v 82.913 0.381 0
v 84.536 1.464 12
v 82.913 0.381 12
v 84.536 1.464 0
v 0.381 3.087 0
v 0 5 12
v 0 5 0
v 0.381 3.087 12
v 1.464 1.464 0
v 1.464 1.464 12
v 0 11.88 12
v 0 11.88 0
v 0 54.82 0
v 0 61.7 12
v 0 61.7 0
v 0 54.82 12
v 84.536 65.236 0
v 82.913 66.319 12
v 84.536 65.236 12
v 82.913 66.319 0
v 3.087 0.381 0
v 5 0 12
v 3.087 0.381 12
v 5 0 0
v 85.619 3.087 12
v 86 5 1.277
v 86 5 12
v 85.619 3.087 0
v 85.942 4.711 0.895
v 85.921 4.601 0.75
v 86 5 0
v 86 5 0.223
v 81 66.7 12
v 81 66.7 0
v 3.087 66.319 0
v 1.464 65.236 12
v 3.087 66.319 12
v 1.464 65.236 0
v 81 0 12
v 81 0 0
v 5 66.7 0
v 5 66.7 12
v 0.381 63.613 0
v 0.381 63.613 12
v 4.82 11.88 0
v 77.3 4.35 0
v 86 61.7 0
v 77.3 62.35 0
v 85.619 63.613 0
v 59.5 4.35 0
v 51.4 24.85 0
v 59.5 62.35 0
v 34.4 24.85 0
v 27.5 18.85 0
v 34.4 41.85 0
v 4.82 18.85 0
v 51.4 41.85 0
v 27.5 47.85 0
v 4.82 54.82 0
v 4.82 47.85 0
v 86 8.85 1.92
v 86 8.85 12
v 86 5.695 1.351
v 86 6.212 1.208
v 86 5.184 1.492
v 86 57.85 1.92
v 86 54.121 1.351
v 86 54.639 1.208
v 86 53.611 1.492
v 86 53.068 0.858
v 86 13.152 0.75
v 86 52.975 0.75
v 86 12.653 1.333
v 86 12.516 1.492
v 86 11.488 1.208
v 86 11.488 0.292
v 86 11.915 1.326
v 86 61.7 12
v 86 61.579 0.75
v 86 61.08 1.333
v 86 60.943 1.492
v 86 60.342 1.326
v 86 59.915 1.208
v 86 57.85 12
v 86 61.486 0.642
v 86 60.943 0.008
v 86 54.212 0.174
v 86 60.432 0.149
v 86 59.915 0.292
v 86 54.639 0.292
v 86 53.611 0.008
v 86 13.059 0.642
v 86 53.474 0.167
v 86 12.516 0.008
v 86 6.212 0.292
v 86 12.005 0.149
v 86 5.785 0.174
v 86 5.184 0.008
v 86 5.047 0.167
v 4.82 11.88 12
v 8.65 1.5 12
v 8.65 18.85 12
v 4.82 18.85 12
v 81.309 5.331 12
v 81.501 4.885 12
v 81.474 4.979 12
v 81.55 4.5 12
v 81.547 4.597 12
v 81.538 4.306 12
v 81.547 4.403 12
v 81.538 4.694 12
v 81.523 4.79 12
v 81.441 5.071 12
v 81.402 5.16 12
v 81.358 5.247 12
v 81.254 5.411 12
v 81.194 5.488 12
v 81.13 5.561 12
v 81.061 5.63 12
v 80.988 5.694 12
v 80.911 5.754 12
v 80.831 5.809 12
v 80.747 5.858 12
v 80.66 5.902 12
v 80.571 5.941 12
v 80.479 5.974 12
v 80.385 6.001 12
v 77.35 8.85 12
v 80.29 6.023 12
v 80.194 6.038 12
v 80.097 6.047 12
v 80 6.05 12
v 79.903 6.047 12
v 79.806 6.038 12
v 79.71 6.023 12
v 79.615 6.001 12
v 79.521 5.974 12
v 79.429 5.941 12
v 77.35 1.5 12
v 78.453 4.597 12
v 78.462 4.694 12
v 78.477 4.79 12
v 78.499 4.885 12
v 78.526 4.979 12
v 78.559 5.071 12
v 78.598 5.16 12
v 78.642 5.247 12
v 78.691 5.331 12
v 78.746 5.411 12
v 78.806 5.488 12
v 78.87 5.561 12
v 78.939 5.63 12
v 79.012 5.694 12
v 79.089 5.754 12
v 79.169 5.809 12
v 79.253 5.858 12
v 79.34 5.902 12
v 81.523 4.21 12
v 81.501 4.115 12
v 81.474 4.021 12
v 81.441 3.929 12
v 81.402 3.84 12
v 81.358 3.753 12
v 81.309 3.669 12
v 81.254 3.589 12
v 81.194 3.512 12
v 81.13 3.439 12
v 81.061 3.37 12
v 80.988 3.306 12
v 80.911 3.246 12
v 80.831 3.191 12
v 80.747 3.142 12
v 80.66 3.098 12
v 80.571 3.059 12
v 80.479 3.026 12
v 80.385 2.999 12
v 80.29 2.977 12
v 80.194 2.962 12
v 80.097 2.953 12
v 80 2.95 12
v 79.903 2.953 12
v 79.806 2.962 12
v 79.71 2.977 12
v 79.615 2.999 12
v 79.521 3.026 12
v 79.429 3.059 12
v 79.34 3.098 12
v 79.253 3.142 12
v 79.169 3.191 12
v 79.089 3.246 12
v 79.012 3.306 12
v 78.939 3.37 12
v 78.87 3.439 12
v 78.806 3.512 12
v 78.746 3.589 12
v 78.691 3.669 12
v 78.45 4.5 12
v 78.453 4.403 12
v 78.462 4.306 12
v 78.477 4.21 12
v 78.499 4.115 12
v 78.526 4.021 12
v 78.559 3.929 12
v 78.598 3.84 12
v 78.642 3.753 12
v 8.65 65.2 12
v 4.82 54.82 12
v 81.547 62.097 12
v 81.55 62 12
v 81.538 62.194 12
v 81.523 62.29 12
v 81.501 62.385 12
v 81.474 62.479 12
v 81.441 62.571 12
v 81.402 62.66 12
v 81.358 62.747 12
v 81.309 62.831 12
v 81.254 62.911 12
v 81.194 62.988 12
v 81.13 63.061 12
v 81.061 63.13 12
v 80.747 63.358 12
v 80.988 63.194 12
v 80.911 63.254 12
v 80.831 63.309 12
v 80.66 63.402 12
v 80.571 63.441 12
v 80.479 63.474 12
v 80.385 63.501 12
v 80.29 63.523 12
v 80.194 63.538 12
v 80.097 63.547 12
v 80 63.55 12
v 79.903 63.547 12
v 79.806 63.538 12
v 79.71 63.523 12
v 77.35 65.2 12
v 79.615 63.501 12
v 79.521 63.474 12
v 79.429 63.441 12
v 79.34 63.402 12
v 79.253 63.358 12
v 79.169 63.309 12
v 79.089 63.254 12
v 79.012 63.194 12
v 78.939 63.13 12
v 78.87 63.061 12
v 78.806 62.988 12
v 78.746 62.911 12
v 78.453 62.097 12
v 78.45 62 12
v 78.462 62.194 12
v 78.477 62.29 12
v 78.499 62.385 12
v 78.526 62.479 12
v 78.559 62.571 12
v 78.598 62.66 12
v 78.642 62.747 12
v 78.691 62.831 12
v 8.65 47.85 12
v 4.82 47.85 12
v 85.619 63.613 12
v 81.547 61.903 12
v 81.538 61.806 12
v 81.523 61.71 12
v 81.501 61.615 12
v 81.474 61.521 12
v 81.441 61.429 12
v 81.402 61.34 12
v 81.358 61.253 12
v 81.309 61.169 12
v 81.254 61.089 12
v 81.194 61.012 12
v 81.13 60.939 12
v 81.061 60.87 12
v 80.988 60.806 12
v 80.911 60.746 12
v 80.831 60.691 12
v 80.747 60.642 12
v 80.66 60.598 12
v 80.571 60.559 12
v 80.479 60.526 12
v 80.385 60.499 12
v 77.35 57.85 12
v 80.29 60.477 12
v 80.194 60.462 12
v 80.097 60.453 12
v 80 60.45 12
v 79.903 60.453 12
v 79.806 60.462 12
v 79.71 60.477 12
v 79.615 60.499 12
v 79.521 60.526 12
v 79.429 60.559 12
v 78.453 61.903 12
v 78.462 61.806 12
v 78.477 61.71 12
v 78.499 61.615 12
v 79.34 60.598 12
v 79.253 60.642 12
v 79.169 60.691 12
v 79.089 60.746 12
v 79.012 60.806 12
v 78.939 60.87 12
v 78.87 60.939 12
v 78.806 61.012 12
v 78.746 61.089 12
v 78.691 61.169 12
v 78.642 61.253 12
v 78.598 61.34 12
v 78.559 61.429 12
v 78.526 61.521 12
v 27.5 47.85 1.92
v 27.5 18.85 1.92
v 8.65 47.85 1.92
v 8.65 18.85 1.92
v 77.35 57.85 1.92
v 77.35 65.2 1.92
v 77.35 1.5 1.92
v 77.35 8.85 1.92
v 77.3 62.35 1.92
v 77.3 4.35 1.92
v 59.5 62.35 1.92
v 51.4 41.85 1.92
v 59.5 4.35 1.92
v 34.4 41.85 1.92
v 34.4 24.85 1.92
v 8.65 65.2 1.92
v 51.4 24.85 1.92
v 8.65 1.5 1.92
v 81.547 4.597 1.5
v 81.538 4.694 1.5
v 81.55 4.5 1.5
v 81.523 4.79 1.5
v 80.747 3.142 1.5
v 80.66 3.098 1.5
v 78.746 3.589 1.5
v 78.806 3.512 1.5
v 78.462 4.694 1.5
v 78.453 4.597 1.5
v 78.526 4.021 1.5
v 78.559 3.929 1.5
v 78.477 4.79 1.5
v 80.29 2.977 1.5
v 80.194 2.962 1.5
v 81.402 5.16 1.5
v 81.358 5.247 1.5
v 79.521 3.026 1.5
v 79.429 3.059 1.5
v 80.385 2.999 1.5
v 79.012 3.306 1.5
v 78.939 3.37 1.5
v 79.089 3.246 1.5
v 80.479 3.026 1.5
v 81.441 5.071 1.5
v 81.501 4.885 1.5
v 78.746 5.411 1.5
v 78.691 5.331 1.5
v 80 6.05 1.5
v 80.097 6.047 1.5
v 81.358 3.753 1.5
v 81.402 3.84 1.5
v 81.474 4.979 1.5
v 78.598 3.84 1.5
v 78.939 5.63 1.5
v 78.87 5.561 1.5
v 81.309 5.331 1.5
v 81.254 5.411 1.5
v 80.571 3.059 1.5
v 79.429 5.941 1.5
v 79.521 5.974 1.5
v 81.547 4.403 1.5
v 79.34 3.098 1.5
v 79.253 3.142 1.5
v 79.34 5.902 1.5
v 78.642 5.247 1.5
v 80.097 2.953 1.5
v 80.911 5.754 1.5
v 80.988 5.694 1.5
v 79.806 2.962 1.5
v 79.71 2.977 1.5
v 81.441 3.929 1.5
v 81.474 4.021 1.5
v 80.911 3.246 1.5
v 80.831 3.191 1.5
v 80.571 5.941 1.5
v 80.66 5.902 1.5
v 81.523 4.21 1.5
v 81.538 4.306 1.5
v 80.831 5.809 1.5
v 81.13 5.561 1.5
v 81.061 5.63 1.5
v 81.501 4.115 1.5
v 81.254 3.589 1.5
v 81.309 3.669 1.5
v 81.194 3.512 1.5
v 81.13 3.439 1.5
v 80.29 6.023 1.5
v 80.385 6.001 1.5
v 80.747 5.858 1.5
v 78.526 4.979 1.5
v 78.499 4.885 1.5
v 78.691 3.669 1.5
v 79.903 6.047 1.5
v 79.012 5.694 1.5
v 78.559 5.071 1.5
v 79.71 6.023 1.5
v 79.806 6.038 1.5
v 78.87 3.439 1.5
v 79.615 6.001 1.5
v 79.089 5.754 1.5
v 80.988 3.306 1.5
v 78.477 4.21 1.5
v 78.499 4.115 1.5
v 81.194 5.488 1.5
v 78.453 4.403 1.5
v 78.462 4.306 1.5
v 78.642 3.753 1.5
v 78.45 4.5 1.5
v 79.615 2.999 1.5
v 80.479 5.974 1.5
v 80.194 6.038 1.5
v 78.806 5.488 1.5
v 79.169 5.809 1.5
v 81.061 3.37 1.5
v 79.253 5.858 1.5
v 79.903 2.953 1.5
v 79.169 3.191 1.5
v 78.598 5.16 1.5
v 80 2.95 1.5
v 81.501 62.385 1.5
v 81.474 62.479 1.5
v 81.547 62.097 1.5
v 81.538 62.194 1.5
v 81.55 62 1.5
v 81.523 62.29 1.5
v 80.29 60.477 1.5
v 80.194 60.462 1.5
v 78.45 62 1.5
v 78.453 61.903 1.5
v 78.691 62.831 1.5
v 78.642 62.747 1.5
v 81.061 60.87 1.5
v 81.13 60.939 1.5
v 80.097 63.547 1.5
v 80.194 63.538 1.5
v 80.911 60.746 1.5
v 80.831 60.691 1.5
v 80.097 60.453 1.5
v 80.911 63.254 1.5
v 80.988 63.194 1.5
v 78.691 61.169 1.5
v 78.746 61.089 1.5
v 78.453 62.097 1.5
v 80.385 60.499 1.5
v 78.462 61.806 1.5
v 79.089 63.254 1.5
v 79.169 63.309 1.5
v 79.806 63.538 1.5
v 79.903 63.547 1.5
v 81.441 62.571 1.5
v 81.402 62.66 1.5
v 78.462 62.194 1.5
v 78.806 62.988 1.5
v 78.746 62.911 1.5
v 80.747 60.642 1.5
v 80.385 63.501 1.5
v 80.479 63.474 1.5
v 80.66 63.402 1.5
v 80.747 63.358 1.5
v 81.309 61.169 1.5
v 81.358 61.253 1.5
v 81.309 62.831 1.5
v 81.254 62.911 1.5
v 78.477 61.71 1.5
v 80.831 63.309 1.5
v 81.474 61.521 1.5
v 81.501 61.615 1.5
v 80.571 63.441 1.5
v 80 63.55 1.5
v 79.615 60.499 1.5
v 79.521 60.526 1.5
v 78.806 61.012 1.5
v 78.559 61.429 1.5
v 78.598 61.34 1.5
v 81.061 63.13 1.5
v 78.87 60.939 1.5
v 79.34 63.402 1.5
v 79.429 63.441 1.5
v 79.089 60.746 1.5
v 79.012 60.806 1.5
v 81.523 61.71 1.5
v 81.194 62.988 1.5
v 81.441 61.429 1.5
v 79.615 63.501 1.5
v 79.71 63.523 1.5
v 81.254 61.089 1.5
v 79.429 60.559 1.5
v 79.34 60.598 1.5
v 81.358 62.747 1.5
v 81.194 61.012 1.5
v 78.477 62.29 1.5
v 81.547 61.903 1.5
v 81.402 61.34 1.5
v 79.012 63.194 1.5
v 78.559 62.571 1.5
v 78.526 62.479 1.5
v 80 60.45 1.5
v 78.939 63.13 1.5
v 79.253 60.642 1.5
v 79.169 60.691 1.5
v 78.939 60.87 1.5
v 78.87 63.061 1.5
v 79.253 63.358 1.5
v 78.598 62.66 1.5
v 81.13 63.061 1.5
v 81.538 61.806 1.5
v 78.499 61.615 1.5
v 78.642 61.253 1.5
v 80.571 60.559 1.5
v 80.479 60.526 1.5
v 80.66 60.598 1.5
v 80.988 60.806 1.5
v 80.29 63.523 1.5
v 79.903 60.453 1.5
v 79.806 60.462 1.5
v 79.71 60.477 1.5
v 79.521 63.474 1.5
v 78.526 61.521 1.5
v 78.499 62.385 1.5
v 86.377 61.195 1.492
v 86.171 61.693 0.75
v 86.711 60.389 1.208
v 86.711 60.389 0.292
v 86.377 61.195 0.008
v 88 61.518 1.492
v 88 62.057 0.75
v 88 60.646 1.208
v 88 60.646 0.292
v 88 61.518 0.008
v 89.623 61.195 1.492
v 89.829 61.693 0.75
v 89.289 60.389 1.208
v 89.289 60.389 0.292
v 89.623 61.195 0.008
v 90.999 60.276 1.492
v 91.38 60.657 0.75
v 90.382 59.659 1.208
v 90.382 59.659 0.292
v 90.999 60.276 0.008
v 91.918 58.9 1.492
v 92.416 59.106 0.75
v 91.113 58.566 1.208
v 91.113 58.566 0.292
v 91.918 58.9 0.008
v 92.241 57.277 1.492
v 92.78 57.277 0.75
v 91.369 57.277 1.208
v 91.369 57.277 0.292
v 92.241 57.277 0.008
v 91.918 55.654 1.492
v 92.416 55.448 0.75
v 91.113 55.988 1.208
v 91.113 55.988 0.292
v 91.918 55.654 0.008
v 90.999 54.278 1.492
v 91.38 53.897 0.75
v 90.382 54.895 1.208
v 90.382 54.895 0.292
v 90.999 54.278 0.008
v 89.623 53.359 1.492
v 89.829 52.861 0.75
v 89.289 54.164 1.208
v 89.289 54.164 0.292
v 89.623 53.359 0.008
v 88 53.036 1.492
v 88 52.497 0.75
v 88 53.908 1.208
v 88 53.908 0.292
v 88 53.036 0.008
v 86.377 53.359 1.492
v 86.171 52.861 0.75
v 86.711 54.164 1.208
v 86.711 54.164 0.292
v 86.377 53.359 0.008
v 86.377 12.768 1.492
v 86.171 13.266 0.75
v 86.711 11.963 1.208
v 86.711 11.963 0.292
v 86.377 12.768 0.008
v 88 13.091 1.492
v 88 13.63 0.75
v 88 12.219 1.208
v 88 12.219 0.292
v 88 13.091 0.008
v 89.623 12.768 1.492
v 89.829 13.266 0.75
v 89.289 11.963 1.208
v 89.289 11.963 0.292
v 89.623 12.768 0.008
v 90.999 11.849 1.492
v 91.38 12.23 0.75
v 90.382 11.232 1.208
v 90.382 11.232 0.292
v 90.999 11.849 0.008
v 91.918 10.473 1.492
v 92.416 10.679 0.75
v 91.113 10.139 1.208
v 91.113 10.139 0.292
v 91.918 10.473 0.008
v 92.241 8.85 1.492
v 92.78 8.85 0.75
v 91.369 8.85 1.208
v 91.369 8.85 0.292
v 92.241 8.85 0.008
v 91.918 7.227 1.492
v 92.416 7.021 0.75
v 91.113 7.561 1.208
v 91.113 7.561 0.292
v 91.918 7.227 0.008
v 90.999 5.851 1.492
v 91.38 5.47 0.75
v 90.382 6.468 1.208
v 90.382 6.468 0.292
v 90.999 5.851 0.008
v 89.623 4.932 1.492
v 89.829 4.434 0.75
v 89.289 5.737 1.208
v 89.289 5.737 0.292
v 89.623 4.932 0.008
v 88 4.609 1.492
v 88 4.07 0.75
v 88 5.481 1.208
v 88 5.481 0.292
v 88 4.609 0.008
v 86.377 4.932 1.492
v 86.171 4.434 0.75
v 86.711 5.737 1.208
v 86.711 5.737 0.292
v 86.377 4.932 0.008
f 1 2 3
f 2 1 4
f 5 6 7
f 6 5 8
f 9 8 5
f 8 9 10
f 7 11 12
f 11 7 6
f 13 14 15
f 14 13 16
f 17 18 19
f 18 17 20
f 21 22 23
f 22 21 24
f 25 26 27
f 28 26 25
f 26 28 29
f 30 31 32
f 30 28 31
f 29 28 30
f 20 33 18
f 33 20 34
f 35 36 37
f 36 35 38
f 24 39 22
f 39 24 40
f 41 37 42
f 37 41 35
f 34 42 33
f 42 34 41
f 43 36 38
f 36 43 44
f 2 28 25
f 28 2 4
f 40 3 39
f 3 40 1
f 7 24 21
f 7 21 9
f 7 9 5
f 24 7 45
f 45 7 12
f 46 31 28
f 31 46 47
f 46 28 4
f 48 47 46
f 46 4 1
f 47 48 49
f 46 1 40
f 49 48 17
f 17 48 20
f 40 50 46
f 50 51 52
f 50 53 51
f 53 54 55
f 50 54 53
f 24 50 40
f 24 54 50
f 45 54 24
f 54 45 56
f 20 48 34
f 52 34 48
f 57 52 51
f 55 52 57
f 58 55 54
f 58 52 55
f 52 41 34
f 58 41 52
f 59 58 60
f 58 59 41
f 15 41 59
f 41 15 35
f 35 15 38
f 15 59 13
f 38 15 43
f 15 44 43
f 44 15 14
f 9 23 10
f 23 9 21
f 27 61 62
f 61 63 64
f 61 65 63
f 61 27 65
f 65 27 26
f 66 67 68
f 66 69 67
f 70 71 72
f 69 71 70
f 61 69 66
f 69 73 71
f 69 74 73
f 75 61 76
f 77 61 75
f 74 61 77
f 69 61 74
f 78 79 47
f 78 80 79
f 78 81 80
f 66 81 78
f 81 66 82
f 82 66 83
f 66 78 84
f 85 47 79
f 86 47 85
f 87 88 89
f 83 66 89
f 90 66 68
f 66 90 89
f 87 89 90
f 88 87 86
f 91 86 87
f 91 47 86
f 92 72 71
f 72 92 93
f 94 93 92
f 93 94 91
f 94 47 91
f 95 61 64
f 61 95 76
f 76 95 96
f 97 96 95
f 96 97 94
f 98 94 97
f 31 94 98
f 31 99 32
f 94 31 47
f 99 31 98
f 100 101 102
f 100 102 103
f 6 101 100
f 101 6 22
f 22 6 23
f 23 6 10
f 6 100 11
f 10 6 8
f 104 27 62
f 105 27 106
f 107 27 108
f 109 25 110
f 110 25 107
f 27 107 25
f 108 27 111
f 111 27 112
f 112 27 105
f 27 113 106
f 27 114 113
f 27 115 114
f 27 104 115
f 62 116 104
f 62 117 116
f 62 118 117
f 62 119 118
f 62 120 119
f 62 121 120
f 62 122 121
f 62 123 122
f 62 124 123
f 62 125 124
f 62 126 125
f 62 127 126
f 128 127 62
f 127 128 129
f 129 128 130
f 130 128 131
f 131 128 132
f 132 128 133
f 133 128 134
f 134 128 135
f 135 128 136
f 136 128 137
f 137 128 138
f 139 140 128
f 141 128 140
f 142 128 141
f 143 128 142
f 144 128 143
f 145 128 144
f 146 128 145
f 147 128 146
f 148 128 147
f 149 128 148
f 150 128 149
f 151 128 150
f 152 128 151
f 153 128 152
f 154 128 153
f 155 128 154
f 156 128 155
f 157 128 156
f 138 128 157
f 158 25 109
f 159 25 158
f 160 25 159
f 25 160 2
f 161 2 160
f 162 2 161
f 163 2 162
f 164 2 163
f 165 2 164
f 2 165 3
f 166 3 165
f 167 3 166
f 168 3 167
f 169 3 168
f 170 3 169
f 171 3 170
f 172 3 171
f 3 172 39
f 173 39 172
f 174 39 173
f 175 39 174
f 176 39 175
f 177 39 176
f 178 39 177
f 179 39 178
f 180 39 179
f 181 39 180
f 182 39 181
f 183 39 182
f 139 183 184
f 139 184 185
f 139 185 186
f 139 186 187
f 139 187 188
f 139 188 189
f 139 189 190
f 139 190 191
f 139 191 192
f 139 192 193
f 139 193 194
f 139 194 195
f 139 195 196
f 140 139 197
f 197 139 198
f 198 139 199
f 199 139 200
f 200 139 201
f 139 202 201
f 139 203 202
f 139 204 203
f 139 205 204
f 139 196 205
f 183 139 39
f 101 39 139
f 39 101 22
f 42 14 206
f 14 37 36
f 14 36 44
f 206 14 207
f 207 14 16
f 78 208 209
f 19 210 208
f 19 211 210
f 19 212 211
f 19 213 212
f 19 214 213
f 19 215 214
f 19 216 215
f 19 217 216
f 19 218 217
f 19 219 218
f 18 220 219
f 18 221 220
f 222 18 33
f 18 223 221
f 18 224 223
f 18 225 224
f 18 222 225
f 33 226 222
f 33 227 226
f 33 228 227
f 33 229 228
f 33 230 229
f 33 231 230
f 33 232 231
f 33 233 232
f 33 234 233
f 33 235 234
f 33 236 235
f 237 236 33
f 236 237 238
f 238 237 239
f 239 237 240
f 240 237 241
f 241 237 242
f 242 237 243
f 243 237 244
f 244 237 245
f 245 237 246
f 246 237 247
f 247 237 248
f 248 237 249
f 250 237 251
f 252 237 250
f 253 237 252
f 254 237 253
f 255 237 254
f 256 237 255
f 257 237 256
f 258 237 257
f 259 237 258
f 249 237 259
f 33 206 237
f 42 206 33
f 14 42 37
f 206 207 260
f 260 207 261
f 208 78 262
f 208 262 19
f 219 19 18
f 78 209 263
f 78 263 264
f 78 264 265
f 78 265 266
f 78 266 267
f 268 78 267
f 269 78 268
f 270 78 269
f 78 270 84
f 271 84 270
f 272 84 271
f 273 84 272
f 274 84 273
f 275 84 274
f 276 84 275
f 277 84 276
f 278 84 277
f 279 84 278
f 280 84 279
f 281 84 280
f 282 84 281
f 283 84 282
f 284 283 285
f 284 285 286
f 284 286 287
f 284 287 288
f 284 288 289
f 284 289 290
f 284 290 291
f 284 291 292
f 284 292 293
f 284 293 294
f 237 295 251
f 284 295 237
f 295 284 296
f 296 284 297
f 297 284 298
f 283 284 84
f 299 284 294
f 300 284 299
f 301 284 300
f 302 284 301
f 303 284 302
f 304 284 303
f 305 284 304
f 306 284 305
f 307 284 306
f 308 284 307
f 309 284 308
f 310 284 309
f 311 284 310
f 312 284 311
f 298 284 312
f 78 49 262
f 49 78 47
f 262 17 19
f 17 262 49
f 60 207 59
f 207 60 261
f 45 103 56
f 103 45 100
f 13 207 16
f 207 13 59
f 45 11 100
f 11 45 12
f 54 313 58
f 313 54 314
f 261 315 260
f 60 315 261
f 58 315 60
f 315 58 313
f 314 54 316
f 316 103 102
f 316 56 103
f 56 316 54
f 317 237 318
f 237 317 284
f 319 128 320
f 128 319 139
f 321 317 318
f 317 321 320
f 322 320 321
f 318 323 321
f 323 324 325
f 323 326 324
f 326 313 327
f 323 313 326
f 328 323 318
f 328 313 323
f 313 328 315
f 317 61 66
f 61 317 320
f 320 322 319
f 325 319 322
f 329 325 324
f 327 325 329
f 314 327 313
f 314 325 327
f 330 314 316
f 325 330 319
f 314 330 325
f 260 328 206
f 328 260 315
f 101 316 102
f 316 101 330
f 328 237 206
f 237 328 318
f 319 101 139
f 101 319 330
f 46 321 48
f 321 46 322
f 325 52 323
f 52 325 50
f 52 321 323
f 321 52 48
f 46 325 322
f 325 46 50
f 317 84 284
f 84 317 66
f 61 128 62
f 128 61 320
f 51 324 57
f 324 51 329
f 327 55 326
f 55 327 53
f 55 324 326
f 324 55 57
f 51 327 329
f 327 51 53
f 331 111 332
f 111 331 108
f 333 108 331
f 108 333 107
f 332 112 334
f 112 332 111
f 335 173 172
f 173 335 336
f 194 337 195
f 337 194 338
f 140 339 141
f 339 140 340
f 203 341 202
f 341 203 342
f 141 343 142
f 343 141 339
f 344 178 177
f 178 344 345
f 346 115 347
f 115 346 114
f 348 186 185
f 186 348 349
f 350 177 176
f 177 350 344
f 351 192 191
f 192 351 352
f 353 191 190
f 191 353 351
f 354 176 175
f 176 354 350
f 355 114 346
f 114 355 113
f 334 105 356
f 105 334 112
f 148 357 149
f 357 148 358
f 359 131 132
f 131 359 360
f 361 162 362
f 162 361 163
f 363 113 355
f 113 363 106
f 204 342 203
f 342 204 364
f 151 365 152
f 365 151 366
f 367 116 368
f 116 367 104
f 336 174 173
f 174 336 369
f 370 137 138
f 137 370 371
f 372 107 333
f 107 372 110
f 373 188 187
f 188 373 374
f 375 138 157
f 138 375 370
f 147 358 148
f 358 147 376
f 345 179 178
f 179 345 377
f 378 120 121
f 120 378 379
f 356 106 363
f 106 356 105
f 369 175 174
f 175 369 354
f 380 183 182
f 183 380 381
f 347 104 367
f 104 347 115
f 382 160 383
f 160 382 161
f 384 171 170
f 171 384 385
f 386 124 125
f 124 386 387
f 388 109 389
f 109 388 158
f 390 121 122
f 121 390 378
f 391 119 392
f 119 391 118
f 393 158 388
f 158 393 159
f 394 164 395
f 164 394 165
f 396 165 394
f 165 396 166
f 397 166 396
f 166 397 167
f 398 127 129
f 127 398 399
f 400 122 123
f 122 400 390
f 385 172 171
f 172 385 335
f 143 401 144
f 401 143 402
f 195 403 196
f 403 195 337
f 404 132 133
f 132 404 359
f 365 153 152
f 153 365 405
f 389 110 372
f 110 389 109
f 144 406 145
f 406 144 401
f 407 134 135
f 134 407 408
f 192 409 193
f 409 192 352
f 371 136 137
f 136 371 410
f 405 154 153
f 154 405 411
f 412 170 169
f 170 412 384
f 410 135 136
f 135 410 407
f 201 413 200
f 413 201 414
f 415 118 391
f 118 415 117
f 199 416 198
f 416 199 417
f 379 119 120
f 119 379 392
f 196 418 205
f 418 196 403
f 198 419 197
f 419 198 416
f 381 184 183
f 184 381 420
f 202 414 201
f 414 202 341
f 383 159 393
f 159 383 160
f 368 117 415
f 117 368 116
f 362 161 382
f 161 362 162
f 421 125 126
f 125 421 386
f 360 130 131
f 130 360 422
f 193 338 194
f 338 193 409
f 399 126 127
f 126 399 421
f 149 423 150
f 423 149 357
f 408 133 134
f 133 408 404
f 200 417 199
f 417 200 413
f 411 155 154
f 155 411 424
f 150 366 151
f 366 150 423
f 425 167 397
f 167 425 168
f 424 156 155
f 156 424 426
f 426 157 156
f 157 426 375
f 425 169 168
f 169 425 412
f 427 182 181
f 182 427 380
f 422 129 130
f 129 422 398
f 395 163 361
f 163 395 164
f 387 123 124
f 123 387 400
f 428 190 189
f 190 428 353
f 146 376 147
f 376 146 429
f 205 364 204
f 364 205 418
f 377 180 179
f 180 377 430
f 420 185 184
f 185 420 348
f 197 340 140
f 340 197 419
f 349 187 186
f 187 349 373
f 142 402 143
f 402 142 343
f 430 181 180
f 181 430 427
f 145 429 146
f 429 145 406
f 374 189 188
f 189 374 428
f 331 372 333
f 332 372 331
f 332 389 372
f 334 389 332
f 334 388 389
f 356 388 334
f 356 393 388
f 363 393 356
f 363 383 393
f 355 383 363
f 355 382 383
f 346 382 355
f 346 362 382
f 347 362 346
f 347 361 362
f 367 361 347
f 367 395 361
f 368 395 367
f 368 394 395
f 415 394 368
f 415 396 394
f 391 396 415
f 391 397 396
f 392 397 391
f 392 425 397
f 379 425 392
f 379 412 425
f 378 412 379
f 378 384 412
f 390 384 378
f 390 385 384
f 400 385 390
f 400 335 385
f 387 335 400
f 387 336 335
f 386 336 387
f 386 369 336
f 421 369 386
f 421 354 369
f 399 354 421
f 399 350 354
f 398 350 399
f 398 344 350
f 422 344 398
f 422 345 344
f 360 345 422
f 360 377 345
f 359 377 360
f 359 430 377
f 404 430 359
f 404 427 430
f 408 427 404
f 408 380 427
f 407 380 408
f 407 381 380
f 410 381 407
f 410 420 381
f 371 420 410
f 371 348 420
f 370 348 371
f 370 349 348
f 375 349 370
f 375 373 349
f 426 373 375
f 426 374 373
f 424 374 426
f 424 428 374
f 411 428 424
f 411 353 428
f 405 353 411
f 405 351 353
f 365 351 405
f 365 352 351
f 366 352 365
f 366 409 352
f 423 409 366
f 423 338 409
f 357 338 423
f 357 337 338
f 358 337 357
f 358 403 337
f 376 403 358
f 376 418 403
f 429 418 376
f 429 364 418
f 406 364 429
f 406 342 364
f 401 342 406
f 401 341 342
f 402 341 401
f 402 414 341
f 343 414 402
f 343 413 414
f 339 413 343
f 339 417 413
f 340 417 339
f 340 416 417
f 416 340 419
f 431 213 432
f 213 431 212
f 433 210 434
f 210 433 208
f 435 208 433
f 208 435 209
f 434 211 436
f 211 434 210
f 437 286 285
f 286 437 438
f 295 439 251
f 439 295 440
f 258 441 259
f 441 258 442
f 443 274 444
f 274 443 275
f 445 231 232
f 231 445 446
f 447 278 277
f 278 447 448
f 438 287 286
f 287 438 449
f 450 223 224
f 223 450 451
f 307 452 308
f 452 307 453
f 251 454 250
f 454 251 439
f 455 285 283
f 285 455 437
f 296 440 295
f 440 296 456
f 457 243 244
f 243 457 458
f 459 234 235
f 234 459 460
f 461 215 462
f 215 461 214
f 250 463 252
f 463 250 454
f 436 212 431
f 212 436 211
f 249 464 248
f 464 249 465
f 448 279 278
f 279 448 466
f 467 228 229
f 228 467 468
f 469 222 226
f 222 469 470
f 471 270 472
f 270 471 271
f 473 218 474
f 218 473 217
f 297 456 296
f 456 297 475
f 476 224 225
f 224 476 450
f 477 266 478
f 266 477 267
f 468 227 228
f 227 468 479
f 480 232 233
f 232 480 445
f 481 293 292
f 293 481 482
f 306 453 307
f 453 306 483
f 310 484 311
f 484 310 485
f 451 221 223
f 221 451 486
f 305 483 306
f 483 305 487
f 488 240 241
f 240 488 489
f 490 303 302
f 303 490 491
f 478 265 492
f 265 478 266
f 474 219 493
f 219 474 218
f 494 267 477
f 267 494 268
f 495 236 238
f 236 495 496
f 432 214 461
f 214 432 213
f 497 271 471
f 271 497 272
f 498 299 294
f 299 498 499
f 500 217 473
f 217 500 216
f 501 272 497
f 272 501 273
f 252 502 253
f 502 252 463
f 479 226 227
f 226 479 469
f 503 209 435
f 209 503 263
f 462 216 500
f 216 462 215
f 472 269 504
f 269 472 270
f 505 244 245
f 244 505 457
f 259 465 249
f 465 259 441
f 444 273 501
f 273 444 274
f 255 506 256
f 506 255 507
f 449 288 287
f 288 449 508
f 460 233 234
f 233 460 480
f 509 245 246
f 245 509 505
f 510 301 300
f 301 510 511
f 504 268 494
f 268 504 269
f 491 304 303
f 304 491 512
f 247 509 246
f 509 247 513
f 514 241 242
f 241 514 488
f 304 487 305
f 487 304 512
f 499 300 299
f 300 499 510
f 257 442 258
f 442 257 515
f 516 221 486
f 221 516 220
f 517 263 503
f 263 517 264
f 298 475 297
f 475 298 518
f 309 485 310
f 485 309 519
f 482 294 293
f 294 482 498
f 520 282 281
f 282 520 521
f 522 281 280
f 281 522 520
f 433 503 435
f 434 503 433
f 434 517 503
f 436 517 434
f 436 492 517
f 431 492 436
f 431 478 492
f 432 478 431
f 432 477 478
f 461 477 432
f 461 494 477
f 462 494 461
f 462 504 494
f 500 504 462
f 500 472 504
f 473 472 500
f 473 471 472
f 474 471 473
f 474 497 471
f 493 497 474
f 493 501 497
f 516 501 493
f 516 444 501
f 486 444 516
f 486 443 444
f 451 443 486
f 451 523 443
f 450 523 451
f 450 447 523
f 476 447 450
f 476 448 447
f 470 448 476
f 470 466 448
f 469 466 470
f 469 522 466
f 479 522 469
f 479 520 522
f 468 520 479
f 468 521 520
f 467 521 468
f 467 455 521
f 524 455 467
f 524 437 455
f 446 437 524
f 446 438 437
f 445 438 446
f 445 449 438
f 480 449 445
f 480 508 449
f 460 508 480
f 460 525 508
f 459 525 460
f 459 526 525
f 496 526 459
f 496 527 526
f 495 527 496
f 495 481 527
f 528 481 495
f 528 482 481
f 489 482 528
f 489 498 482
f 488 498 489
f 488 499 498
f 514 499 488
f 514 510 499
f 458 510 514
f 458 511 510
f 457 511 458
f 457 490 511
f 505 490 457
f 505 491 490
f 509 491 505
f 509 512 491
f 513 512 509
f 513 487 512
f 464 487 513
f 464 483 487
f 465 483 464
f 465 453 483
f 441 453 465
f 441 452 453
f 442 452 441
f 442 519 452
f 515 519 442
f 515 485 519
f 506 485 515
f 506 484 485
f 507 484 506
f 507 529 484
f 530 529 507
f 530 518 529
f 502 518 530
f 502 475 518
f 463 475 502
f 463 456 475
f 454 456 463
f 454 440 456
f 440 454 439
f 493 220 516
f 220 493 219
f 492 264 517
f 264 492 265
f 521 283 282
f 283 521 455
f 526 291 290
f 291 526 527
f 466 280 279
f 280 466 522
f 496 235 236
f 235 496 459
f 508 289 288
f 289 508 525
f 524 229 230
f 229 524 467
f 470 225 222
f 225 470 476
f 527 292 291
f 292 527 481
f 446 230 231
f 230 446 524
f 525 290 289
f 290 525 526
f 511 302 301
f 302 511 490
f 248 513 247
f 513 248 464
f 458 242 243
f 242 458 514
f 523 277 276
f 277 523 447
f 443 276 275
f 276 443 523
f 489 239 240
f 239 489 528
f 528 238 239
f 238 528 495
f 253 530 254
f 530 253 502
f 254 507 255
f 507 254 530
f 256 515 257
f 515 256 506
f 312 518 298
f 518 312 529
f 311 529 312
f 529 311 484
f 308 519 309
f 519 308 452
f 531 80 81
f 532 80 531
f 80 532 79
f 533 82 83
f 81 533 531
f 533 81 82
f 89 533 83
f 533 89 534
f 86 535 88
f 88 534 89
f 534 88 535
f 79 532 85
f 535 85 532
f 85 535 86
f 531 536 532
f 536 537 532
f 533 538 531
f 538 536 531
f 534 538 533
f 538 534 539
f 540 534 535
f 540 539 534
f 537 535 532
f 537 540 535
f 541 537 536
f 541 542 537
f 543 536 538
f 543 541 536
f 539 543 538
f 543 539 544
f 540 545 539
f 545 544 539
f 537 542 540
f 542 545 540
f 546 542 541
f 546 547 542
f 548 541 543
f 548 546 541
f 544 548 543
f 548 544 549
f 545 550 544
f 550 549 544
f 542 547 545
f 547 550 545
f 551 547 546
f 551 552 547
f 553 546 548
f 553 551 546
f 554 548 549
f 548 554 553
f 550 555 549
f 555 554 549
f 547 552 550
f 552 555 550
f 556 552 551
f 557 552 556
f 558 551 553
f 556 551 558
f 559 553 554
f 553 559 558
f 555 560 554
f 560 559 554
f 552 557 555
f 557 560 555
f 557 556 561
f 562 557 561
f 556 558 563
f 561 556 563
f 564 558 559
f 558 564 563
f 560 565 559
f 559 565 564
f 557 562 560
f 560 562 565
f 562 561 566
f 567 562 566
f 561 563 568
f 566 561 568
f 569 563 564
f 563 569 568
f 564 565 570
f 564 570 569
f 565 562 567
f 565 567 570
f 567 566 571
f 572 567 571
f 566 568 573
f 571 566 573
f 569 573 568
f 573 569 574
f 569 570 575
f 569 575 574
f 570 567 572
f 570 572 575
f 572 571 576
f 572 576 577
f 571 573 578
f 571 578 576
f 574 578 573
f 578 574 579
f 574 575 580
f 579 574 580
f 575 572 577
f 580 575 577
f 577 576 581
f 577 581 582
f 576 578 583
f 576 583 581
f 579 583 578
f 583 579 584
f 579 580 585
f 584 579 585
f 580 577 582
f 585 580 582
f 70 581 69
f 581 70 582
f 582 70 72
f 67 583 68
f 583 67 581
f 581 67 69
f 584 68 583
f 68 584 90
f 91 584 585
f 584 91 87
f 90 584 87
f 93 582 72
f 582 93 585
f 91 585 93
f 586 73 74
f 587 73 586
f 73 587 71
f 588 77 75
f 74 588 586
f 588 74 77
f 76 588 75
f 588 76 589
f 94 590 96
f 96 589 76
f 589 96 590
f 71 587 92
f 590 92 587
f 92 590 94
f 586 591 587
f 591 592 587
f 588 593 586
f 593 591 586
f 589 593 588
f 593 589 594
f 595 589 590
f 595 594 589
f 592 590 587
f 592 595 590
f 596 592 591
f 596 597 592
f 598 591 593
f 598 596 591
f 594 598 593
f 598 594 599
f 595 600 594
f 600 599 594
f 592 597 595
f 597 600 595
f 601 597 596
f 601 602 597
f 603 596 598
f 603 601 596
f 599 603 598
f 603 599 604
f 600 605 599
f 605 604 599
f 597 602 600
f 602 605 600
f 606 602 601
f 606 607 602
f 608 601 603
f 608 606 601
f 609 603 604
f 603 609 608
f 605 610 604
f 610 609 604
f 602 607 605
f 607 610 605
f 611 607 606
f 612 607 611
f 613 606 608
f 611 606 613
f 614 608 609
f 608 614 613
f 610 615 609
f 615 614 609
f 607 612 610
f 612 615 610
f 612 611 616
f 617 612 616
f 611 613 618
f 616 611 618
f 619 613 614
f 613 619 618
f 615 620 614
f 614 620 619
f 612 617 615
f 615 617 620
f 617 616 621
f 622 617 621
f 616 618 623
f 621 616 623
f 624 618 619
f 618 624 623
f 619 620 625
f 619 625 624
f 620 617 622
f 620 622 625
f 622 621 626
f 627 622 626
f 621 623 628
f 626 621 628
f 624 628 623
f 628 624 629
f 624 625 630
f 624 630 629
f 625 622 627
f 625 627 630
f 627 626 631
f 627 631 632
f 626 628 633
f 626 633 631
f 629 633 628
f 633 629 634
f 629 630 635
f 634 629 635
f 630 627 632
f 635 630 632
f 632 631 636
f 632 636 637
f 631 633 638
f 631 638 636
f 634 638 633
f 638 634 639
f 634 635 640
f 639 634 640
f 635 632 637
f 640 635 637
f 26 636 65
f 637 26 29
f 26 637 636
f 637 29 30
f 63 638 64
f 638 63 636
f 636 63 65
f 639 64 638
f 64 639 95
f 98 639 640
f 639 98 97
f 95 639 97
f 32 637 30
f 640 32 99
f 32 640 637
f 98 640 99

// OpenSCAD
// Please feel free to remix or use this badge cover in any way that keeps with the limits of OpenTexus

// Depending on filament used, the dimensions might need to be adjusted due to shrinking or expanding

// Define constants for reusable values
cylinderOffset = 2;
cylinderYSpacing = 42;
cornerRadius = 5;

// Outer rectangle parameters
length = 86.00;
width = 66.70;
height = 12.00;

// Hole parameters
holeParams = [
    // Bottom Hole
    [4.82, 42.94, height], // Display Hole
    [27.50, 29.00, height],  // Body Hole
    [67.45 + 1.25, 63.70, 10.08], // Battery Hole
    [17.80, 58.00, 3.00],    // Top Hole
    [10.34, 49.00, 10.08],   // D5 Joystick Hole
    [17.00, 17.00, 2.00]     
];

// Function to create a rectangular hole
module rectangular_hole(x, y, z, len, wid, height) {
    translate([x, y, z])
        cube([len, wid, height]);
}

// Function to create a cylindrical hole
module cylindrical_hole(x, y, z, r, height) {
    translate([x, y, z])
        cylinder(r=r, h=height, $fn=100); // $fn sets the resolution of the cylinder
}

// Create the rounded rectangle using hull() for 3D rounded corners
module rounded_rectangle(len, wid, h, rad) {
    hull() {
        translate([rad, rad, 0])
            cylinder(h=h, r=rad);
        translate([len-rad, rad, 0])
            cylinder(h=h, r=rad);
        translate([rad, wid-rad, 0])
            cylinder(h=h, r=rad);
        translate([len-rad, wid-rad, 0])
            cylinder(h=h, r=rad);
    }
}

// Module for the left torus
module left_torus(r1, r2) {
    rotate_extrude(angle = 360)
        translate([r1, 0, 0])  // Keep original center for rotation
        circle(r = r2);
}

// Module for the right torus
module right_torus(r1, r2) {
    rotate_extrude(angle = 360)
        translate([r1, 0, 0])
        circle(r = r2);
}

difference() {
    // Create outer rounded rectangle
    rounded_rectangle(length, width, height, cornerRadius);

    // Create all holes using loop
    // BottomHole
    rectangular_hole(0, (width - holeParams[0][1]) / 2, 0, holeParams[0][0], holeParams[0][1], holeParams[0][2]); 
    // DisplayHole
    rectangular_hole(0, (width - holeParams[1][1]) / 2, 0, holeParams[1][0], holeParams[1][1], holeParams[1][2]); // BodyHole
    rectangular_hole((length - holeParams[2][0]) / 2, (width - holeParams[2][1]) / 2, height - holeParams[2][2], holeParams[2][0], holeParams[2][1], holeParams[2][2]); // BatteryHole
    rectangular_hole(length - holeParams[3][0] - 8.7, (width - holeParams[3][1]) / 2, 0, holeParams[3][0], holeParams[3][1], holeParams[3][2]); // TopHole
    rectangular_hole(length - holeParams[4][0], (width - holeParams[4][1]) / 2, height - holeParams[4][2], holeParams[4][0], holeParams[4][1], holeParams[4][2]); // D5JoystickHole
    rectangular_hole(length - 34.6 - holeParams[5][0], (width - holeParams[5][1]) / 2, 0, holeParams[5][0], holeParams[5][1], holeParams[5][2]);
    
    // Right screw hole
    cylindrical_hole(80, 4.5, 1.5, 1.55, 10.50);
    
    // Left screw hole
    cylindrical_hole(80, 62, 1.5, 1.55, 10.50);
}

// Right torus (Lanyard connector)
translate([length + 2, width - holeParams[4][1] / 5.2, height - holeParams[4][2] - 1.17]) {  // Move torus
    right_torus(r1 = 8 / 2, r2 = 1.56 / 2); 
}

// Left torus (Lanyard connector)
translate([length + 2, (width - holeParams[4][1]) / 2, height - holeParams[4][2] - 1.17]) {  // Move torus
    left_torus(r1 = 8 / 2, r2 = 1.56 / 2);
}
